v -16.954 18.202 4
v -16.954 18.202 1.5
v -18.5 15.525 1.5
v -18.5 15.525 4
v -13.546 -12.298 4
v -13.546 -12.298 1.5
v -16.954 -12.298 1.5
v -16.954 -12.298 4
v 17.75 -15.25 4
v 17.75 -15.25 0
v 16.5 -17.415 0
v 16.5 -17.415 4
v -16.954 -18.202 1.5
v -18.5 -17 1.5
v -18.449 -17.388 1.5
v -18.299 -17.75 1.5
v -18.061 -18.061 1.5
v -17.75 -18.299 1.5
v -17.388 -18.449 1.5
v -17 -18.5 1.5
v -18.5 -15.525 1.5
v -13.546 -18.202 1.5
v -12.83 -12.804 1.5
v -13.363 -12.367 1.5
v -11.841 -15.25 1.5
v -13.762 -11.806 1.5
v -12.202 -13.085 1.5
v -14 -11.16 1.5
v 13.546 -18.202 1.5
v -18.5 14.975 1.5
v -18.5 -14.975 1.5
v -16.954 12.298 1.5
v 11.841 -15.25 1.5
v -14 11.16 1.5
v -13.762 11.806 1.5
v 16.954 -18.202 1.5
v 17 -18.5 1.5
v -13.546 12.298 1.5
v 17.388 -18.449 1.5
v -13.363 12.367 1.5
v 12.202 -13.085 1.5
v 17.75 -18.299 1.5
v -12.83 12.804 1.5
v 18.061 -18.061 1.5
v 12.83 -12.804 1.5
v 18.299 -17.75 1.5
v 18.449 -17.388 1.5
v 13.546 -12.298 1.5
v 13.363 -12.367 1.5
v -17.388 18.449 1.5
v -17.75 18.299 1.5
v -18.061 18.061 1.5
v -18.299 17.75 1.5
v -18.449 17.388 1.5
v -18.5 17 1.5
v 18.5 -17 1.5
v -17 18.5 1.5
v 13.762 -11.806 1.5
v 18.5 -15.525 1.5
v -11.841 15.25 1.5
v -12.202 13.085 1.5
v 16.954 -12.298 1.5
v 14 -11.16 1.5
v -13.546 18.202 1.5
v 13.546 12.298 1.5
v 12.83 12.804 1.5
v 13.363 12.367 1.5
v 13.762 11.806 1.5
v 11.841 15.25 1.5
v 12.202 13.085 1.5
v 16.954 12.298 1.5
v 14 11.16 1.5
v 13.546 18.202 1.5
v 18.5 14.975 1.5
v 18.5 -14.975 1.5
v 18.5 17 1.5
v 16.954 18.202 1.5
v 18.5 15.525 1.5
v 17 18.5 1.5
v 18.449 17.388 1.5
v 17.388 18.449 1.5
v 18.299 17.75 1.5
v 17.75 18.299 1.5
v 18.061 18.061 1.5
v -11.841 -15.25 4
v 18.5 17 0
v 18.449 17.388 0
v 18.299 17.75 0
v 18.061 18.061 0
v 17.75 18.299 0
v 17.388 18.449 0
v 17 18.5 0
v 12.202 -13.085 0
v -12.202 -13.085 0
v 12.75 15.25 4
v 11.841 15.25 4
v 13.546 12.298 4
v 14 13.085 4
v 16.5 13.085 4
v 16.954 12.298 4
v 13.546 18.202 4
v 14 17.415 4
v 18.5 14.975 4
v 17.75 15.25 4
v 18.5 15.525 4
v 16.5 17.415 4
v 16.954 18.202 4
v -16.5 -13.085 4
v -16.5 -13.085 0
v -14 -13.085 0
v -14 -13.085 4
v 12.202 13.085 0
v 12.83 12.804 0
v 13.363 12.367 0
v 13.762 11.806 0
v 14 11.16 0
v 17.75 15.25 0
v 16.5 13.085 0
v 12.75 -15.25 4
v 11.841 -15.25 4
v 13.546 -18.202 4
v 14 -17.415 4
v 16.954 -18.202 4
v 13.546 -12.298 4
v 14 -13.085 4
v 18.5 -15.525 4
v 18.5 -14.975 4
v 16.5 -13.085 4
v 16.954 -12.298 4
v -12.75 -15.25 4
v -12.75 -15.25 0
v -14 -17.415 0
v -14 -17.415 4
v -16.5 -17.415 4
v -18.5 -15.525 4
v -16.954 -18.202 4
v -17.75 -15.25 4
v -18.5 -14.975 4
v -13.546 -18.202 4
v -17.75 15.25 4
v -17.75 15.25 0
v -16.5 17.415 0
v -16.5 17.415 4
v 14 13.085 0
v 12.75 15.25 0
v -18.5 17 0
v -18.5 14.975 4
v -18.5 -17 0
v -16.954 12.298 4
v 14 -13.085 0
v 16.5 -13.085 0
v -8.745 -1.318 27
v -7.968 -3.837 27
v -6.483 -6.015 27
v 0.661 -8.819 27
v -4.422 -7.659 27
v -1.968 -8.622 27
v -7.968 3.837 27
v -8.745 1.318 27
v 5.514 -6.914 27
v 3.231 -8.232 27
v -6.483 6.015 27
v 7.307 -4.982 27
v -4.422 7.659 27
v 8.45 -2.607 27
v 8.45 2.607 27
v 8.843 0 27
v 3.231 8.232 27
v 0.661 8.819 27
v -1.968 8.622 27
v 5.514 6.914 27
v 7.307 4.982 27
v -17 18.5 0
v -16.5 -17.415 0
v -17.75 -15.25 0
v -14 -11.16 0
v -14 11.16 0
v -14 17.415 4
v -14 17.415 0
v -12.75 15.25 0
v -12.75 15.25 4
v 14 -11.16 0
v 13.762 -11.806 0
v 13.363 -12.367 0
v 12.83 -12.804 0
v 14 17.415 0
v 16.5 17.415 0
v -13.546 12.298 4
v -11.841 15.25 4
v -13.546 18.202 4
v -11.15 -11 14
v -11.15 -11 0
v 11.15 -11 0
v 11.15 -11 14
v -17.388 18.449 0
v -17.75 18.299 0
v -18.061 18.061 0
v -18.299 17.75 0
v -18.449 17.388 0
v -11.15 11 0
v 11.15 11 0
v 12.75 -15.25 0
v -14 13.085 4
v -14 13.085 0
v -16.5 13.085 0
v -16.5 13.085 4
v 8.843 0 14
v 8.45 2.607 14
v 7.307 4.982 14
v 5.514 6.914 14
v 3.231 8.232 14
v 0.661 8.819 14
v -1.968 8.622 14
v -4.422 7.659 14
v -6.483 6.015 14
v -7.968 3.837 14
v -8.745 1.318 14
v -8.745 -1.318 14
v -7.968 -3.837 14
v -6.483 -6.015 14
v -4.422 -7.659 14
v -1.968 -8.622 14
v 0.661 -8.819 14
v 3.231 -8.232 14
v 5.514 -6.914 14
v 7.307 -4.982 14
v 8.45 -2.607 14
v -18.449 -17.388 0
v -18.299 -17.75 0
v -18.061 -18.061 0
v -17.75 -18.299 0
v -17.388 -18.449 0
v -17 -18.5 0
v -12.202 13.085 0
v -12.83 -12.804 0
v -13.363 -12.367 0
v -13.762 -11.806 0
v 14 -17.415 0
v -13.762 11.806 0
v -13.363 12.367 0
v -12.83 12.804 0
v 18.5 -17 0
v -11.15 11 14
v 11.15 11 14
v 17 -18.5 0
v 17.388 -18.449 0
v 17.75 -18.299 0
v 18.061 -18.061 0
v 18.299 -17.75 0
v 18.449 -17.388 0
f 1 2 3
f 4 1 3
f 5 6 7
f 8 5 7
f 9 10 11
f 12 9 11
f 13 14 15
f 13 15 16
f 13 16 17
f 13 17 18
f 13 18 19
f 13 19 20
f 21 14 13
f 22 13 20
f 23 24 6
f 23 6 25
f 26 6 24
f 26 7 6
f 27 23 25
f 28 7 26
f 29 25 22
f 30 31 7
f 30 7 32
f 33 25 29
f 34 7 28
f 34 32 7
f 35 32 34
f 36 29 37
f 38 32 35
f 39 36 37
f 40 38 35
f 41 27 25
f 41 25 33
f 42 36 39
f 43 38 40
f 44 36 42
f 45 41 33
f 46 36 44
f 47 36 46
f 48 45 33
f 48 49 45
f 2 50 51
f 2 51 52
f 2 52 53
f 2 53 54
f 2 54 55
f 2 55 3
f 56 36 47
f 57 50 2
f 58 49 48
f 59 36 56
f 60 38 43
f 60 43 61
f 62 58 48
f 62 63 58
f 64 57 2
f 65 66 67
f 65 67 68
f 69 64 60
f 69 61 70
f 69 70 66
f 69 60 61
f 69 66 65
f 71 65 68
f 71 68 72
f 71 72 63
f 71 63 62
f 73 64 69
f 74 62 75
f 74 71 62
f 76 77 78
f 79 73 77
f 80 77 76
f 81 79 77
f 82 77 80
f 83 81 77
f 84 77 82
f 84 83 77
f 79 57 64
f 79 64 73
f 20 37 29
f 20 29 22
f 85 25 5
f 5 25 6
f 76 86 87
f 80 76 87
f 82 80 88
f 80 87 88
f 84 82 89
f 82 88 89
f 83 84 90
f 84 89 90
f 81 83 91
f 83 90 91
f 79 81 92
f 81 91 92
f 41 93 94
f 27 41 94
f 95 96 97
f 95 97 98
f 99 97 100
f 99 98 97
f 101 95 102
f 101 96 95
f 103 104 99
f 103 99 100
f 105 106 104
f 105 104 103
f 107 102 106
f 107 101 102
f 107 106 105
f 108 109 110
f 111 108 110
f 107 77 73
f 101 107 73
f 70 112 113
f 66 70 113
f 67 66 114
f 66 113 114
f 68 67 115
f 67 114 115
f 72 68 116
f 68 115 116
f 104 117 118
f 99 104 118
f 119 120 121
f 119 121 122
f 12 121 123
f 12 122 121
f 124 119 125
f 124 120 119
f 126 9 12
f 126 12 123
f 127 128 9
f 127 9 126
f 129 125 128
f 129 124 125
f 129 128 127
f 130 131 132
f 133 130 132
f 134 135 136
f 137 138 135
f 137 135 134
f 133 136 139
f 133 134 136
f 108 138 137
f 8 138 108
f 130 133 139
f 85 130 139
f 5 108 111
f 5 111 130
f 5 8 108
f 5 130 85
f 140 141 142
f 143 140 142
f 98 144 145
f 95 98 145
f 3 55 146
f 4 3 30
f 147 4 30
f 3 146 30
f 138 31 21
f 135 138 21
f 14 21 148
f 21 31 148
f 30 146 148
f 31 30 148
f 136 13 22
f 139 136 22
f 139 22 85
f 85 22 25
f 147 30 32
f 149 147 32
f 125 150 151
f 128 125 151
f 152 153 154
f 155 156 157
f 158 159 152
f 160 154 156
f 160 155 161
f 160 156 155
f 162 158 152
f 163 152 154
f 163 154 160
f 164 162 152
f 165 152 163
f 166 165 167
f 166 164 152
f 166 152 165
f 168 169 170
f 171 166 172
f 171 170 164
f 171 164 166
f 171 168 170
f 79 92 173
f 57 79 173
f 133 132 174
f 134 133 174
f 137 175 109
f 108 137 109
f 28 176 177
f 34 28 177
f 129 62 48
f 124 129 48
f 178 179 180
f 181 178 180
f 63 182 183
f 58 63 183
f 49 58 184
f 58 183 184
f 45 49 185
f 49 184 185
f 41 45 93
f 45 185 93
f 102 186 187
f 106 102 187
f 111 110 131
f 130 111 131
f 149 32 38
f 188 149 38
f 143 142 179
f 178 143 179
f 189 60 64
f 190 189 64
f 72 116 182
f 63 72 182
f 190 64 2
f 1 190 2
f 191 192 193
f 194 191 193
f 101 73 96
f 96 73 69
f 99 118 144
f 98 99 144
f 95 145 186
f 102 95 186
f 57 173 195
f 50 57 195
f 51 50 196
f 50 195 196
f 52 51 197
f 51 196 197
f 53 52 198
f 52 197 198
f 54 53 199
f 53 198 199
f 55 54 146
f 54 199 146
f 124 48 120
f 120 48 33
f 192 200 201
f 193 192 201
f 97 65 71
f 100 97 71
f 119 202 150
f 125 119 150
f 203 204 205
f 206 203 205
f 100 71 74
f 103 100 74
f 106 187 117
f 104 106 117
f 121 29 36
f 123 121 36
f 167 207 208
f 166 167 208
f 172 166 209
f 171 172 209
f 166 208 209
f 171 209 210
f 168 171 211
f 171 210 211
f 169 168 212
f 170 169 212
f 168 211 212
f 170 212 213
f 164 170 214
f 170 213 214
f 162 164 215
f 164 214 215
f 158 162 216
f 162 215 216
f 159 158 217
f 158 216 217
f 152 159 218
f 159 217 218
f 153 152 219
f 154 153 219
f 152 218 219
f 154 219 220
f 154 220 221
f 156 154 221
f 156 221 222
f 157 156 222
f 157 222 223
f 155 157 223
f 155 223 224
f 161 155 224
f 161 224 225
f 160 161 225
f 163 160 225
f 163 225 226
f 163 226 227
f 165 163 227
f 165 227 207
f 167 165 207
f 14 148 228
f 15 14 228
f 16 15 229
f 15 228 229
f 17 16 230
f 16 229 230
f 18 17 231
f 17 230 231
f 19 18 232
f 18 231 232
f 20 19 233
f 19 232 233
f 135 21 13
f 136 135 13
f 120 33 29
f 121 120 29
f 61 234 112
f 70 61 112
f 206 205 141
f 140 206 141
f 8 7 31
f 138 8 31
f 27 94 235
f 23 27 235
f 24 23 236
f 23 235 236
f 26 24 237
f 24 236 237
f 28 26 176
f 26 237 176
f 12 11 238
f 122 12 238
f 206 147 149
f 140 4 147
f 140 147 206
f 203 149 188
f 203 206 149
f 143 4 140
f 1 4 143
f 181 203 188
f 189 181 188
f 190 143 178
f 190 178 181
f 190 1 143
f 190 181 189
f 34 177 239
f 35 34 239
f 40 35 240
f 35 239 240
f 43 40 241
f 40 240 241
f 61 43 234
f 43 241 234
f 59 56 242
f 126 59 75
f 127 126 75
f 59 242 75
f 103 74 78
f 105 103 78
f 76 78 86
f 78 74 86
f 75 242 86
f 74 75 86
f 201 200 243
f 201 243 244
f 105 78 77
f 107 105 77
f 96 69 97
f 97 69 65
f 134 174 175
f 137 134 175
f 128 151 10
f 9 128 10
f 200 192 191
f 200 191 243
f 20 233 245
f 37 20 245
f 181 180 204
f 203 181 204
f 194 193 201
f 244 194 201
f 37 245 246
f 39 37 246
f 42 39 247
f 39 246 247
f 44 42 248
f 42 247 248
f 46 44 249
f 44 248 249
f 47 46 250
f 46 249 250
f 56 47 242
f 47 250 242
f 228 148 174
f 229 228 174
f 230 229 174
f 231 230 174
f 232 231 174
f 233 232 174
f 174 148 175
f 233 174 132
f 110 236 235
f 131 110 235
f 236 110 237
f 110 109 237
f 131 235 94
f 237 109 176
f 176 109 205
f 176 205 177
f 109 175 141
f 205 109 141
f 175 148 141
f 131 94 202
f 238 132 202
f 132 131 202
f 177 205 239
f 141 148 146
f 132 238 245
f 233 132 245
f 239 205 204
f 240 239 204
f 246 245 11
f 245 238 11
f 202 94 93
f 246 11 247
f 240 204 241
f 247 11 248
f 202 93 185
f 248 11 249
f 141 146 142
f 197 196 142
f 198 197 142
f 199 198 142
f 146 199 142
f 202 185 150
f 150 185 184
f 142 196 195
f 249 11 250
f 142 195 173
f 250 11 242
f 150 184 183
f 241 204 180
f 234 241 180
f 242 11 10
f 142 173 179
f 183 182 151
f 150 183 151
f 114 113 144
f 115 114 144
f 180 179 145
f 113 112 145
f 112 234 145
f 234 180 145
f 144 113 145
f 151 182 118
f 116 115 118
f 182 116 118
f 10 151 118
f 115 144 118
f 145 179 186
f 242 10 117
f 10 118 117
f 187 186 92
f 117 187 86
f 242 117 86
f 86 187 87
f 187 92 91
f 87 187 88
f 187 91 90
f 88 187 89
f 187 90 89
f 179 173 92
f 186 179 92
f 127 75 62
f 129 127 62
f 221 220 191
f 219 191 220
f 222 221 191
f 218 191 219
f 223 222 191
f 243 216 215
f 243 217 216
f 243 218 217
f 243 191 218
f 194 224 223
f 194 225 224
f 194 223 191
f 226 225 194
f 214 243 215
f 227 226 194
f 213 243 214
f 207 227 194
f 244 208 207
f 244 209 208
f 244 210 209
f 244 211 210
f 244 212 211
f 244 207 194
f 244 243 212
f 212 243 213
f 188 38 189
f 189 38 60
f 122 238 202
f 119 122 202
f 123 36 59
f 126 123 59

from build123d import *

# Parameters (mm, degrees)
F1_DEPTH = 1.5
F2_DEPTH = 4
F3_W     = 22.3
F3_H     = 22
F3_R     = 8.843373
F4_DEPTH = 14
F5_DEPTH = 27


with BuildPart() as f1:
    # F0 (on Top) → F1 (new body)
    with BuildSketch(Plane.XY):
        with BuildLine():
            Line((17, 18.5), (-17, 18.5))
            ThreePointArc((-17, 18.5), (-18.06066, 18.06066), (-18.5, 17))
            Line((-18.5, 17), (-18.5, 15.524798))
            Line((-18.5, 15.524798), (-16.954327, 18.201981))
            Line((-16.954327, 18.201981), (-13.545673, 18.201981))
            Line((-13.545673, 18.201981), (-11.841346, 15.25))
            Line((-11.841346, 15.25), (-13.545673, 12.298019))
            Line((-13.545673, 12.298019), (-16.954327, 12.298019))
            Line((-16.954327, 12.298019), (-18.5, 14.975202))
            Line((-18.5, 14.975202), (-18.5, -14.975202))
            Line((-18.5, -14.975202), (-16.954327, -12.298019))
            Line((-16.954327, -12.298019), (-13.545673, -12.298019))
            Line((-13.545673, -12.298019), (-11.841346, -15.25))
            Line((-11.841346, -15.25), (-13.545673, -18.201981))
            Line((-13.545673, -18.201981), (-16.954327, -18.201981))
            Line((-16.954327, -18.201981), (-18.5, -15.524798))
            Line((-18.5, -15.524798), (-18.5, -17))
            ThreePointArc((-18.5, -17), (-18.06066, -18.06066), (-17, -18.5))
            Line((-17, -18.5), (17, -18.5))
            ThreePointArc((17, -18.5), (18.06066, -18.06066), (18.5, -17))
            Line((18.5, -17), (18.5, -15.524798))
            Line((18.5, -15.524798), (16.954327, -18.201981))
            Line((16.954327, -18.201981), (13.545673, -18.201981))
            Line((13.545673, -18.201981), (11.841346, -15.25))
            Line((11.841346, -15.25), (13.545673, -12.298019))
            Line((13.545673, -12.298019), (16.954327, -12.298019))
            Line((16.954327, -12.298019), (18.5, -14.975202))
            Line((18.5, -14.975202), (18.5, 14.975202))
            Line((18.5, 14.975202), (16.954327, 12.298019))
            Line((16.954327, 12.298019), (13.545673, 12.298019))
            Line((13.545673, 12.298019), (11.841346, 15.25))
            Line((11.841346, 15.25), (13.545673, 18.201981))
            Line((13.545673, 18.201981), (16.954327, 18.201981))
            Line((16.954327, 18.201981), (18.5, 15.524798))
            Line((18.5, 15.524798), (18.5, 17))
            ThreePointArc((18.5, 17), (18.06066, 18.06066), (17, 18.5))
        make_face()
        with BuildLine():
            ThreePointArc((12.201923, 13.084936), (13.362658, 12.36714), (14, 11.160353))
            Line((14, 11.160353), (14, -11.160353))
            ThreePointArc((14, -11.160353), (13.362658, -12.36714), (12.201923, -13.084936))
            Line((12.201923, -13.084936), (-12.201923, -13.084936))
            ThreePointArc((-12.201923, -13.084936), (-13.362658, -12.36714), (-14, -11.160353))
            Line((-14, -11.160353), (-14, 11.160353))
            ThreePointArc((-14, 11.160353), (-13.362658, 12.36714), (-12.201923, 13.084936))
            Line((-12.201923, 13.084936), (12.201923, 13.084936))
        make_face(mode=Mode.SUBTRACT)
    extrude(amount=F1_DEPTH)

    # F0 (on Top) → F2 (join)
    with BuildSketch(Plane.XY):
        Polygon((-16.954327, 18.201981), (-18.5, 15.524798), (-18.5, 14.975202), (-16.954327, 12.298019), (-13.545673, 12.298019), (-11.841346, 15.25), (-13.545673, 18.201981), align=None)
        Polygon((-14, 17.415064), (-12.75, 15.25), (-14, 13.084936), (-16.5, 13.084936), (-17.75, 15.25), (-16.5, 17.415064), align=None, mode=Mode.SUBTRACT)
        Polygon((18.5, -15.524798), (18.5, -14.975202), (16.954327, -12.298019), (13.545673, -12.298019), (11.841346, -15.25), (13.545673, -18.201981), (16.954327, -18.201981), align=None)
        Polygon((16.5, -17.415064), (14, -17.415064), (12.75, -15.25), (14, -13.084936), (16.5, -13.084936), (17.75, -15.25), align=None, mode=Mode.SUBTRACT)
        Polygon((-16.954327, -12.298019), (-18.5, -14.975202), (-18.5, -15.524798), (-16.954327, -18.201981), (-13.545673, -18.201981), (-11.841346, -15.25), (-13.545673, -12.298019), align=None)
        Polygon((-16.5, -17.415064), (-17.75, -15.25), (-16.5, -13.084936), (-14, -13.084936), (-12.75, -15.25), (-14, -17.415064), align=None, mode=Mode.SUBTRACT)
        Polygon((18.5, 14.975202), (18.5, 15.524798), (16.954327, 18.201981), (13.545673, 18.201981), (11.841346, 15.25), (13.545673, 12.298019), (16.954327, 12.298019), align=None)
        Polygon((14, 17.415064), (16.5, 17.415064), (17.75, 15.25), (16.5, 13.084936), (14, 13.084936), (12.75, 15.25), align=None, mode=Mode.SUBTRACT)
    extrude(amount=F2_DEPTH)


with BuildPart() as f4:
    # F3 (on Top) → F4 (new body)
    with BuildSketch(Plane.XY):
        Rectangle(F3_W, F3_H)
        Circle(F3_R, mode=Mode.SUBTRACT)
    extrude(amount=F4_DEPTH)

    # F3 (on Top) → F5 (join)
    with BuildSketch(Plane.XY):
        Circle(F3_R)
    extrude(amount=F5_DEPTH)


solid = Compound([f1.part, f4.part])
